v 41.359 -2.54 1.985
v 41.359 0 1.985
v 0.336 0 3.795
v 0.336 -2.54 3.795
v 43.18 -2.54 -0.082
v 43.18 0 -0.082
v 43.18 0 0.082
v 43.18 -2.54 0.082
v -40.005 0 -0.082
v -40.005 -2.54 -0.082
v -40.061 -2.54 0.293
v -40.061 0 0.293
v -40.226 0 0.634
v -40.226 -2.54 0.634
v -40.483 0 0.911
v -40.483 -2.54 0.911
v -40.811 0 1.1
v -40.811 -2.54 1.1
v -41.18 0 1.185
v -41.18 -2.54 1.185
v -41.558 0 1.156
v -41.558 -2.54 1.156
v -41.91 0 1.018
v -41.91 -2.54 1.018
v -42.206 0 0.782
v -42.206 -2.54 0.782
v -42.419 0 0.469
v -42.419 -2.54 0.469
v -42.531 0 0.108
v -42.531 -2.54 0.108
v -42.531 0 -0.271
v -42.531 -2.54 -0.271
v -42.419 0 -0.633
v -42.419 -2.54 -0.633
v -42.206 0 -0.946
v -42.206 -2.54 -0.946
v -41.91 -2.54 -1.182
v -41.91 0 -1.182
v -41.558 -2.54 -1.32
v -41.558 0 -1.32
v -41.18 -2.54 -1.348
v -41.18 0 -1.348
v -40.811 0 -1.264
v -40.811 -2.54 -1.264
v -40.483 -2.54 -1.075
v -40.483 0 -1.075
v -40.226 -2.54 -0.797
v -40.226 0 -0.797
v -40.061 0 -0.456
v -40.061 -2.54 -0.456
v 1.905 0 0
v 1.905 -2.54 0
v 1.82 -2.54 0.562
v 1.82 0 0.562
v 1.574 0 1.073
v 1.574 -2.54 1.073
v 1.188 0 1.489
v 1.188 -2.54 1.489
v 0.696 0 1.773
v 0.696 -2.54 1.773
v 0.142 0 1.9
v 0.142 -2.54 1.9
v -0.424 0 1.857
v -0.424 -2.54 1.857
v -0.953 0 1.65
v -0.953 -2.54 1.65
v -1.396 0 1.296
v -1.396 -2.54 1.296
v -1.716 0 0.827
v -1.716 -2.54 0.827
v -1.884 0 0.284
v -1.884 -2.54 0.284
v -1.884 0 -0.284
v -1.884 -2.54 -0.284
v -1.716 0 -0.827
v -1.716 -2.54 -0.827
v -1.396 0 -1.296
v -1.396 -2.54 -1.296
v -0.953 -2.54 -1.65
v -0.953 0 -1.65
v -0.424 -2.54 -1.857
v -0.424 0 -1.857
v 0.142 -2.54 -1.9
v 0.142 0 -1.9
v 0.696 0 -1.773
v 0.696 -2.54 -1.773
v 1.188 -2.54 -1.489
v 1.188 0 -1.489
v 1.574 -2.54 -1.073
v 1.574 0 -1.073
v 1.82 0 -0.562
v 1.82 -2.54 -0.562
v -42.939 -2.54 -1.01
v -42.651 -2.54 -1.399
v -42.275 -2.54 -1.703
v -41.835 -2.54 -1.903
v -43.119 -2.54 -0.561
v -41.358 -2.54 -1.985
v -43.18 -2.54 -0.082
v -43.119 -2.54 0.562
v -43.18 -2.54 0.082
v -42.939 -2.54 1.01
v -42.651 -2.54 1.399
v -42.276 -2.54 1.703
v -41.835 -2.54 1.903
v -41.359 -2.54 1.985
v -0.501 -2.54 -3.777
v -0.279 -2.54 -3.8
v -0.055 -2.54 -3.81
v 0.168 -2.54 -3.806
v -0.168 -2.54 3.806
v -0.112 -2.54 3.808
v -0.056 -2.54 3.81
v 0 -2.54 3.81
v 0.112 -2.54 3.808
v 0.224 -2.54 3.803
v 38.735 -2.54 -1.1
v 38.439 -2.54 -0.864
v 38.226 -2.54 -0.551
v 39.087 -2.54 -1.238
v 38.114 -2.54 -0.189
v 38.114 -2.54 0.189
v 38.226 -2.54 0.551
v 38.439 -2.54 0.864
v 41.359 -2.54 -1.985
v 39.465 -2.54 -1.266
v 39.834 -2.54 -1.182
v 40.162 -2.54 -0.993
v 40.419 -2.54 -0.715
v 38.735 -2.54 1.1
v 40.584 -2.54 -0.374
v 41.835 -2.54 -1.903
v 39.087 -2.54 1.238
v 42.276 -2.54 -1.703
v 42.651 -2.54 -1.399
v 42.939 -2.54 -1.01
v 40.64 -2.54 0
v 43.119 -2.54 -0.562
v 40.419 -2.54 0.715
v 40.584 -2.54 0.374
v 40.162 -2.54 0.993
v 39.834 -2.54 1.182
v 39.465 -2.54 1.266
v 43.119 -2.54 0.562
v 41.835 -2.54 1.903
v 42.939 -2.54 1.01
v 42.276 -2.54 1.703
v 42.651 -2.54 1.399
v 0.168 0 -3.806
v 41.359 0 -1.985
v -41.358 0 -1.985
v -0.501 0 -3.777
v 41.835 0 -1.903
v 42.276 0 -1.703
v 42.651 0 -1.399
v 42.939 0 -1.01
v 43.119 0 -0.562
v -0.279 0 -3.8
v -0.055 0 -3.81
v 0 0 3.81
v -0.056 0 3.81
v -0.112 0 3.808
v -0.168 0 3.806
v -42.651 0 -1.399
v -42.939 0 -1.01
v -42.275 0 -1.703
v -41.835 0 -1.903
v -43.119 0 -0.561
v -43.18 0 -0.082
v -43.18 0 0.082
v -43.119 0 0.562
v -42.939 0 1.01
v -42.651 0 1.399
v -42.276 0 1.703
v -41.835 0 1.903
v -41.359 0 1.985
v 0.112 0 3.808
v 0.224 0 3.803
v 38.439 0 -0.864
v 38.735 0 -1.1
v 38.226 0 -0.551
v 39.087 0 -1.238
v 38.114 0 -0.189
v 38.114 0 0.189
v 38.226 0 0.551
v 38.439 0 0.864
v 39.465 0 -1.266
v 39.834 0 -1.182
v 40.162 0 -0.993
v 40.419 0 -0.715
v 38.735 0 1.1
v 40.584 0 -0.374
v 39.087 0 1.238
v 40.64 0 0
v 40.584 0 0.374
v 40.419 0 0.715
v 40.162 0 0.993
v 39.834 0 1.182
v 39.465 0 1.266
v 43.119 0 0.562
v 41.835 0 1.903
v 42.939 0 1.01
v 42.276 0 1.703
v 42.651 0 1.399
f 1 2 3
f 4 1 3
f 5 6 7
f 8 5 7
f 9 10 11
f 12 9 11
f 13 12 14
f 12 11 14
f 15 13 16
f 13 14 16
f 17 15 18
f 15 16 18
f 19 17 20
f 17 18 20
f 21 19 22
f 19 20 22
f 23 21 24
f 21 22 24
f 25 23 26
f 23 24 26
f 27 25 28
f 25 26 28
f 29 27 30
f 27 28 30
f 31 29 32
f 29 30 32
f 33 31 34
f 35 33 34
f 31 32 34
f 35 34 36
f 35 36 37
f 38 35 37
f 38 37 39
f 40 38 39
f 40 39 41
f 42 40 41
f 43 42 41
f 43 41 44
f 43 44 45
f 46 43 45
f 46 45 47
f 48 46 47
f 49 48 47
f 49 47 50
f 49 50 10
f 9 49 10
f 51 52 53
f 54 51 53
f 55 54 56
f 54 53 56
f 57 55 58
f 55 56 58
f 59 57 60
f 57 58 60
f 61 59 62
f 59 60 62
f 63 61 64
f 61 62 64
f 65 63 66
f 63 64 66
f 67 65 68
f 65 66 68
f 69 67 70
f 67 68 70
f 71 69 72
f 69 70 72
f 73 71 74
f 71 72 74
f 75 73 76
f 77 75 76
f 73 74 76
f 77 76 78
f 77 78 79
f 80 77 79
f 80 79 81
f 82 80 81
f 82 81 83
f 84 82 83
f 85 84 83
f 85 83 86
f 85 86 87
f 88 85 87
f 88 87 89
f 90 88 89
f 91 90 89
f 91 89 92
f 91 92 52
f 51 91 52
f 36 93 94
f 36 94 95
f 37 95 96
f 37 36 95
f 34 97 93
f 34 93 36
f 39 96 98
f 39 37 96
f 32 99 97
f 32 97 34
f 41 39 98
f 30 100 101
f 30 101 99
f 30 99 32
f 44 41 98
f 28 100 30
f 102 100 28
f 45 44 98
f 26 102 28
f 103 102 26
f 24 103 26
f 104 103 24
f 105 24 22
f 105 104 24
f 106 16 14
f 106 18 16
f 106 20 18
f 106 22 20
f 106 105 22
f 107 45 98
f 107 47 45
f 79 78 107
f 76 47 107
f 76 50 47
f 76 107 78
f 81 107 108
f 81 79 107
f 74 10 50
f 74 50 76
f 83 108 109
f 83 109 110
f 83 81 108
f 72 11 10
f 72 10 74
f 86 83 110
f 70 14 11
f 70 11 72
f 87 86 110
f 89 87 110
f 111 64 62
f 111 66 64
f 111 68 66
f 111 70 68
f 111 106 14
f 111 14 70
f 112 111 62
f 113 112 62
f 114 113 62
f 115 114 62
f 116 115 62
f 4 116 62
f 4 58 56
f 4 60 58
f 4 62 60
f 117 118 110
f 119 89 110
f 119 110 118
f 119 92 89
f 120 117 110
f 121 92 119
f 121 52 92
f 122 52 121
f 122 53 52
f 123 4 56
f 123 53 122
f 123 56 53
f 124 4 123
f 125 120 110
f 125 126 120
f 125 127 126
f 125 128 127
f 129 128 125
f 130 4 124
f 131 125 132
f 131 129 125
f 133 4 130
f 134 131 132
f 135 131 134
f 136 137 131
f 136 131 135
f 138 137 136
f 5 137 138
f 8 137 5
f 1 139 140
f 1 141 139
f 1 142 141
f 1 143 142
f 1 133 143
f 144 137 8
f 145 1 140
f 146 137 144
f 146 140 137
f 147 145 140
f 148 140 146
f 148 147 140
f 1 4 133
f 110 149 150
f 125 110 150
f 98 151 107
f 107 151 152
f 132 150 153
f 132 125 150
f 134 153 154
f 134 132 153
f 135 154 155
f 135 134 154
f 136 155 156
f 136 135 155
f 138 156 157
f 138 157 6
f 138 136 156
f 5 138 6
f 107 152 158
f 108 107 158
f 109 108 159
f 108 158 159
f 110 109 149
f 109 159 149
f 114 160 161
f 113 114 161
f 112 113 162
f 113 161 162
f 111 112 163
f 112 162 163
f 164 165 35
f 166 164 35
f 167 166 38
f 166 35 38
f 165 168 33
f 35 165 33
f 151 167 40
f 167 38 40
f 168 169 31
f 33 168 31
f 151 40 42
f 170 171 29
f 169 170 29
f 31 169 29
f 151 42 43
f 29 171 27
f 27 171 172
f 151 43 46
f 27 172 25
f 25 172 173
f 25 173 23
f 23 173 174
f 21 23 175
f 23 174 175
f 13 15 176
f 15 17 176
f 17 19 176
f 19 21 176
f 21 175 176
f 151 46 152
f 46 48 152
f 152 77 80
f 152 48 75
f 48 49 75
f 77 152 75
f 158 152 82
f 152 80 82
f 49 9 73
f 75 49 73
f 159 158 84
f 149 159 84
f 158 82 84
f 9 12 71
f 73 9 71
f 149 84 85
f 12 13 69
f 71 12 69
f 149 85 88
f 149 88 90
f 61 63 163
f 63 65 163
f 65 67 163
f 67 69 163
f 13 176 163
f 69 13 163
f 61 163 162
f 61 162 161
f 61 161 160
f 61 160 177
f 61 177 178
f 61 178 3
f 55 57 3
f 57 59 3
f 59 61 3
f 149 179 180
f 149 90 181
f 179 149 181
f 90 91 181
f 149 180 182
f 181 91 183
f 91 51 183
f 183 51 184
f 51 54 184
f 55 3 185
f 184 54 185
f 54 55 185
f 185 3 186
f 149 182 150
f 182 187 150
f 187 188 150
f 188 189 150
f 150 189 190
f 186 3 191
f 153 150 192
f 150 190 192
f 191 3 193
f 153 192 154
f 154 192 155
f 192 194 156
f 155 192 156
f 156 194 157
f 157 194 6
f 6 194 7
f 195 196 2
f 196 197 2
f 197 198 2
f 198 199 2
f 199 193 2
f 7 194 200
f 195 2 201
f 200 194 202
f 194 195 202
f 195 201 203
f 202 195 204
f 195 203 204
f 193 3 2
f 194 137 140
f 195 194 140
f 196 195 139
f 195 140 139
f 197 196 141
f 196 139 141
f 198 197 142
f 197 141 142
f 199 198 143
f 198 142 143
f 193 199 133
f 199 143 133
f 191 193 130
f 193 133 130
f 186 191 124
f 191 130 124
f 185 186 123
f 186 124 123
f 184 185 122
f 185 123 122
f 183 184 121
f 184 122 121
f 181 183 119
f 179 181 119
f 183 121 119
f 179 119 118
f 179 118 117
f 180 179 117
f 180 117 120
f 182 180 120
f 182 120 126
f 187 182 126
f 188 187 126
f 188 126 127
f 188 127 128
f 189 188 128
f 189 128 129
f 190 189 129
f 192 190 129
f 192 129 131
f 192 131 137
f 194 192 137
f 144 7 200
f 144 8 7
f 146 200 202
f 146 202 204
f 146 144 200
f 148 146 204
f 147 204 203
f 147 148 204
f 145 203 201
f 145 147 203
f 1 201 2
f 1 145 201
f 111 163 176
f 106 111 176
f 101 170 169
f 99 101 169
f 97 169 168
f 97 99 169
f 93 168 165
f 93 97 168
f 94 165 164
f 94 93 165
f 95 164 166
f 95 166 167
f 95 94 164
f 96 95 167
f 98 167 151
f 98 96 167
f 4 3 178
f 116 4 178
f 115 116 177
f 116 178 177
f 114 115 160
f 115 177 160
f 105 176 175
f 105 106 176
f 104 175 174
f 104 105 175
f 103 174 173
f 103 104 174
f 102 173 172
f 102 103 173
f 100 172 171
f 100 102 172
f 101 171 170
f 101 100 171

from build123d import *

# Parameters (mm, degrees)
F1_DEPTH = 2.54
F2_R     = 1.905
F3_R     = 1.905
F3_R_2   = 1.27
F4_DEPTH = 2.541


with BuildPart() as f1:
    # F0 (on Front) → F1 (new body)
    with BuildSketch(Plane.XZ):
        with BuildLine():
            Line((0.335523, 3.795197), (0, 3.81))
            ThreePointArc((0, 3.81), (-0.084147, 3.809071), (-0.168252, 3.806283))
            ThreePointArc((-0.168252, 3.806283), (-3.806341, 0.166949), (-0.500857, -3.776936))
            Line((-0.500857, -3.776936), (0.168252, -3.806283))
            ThreePointArc((0.168252, -3.806283), (2.75292, -2.633919), (3.81, 0))
            ThreePointArc((3.81, 0), (2.8102, 2.572718), (0.335523, 3.795197))
        make_face()
        with BuildLine():
            ThreePointArc((0.335523, 3.795197), (0.167925, 3.806298), (0, 3.81))
            Line((0, 3.81), (0.335523, 3.795197))
        make_face()
        with BuildLine():
            ThreePointArc((-0.500857, -3.776936), (-3.806341, 0.166949), (-0.168252, 3.806283))
            Line((-0.168252, 3.806283), (-43.18, 1.905))
            Line((-43.18, 1.905), (-43.18, -1.905))
            Line((-43.18, -1.905), (-0.500857, -3.776936))
        make_face()
        with BuildLine():
            Line((43.18, 1.905), (0.335523, 3.795197))
            ThreePointArc((0.335523, 3.795197), (2.8102, 2.572718), (3.81, 0))
            ThreePointArc((3.81, 0), (2.75292, -2.633919), (0.168252, -3.806283))
            Line((0.168252, -3.806283), (43.18, -1.905))
            Line((43.18, -1.905), (43.18, 1.905))
        make_face()
        with BuildLine():
            Line((0.168252, -3.806283), (-0.500857, -3.776936))
            ThreePointArc((-0.500857, -3.776936), (-0.166949, -3.806341), (0.168252, -3.806283))
        make_face()
    extrude(amount=F1_DEPTH)

    # F2
    f2_edges = [f1.edges().sort_by_distance(p)[0] for p in [
        (43.18, -1.27, -1.905),
        (43.18, -1.27, 1.905),
        (-43.18, -1.27, 1.905),
        (-43.18, -1.27, -1.905),
    ]]
    fillet(f2_edges, radius=F2_R)

    # F3 (on face) → F4 (cut, through all)
    with BuildSketch(Plane.XZ.offset(2.54)):
        Circle(F3_R)
        with Locations((39.37, 0)):
            Circle(F3_R_2)
        with Locations((-41.275, -0.081723)):
            Circle(F3_R_2)
    extrude(amount=-F4_DEPTH, mode=Mode.SUBTRACT)


solid = f1.part
